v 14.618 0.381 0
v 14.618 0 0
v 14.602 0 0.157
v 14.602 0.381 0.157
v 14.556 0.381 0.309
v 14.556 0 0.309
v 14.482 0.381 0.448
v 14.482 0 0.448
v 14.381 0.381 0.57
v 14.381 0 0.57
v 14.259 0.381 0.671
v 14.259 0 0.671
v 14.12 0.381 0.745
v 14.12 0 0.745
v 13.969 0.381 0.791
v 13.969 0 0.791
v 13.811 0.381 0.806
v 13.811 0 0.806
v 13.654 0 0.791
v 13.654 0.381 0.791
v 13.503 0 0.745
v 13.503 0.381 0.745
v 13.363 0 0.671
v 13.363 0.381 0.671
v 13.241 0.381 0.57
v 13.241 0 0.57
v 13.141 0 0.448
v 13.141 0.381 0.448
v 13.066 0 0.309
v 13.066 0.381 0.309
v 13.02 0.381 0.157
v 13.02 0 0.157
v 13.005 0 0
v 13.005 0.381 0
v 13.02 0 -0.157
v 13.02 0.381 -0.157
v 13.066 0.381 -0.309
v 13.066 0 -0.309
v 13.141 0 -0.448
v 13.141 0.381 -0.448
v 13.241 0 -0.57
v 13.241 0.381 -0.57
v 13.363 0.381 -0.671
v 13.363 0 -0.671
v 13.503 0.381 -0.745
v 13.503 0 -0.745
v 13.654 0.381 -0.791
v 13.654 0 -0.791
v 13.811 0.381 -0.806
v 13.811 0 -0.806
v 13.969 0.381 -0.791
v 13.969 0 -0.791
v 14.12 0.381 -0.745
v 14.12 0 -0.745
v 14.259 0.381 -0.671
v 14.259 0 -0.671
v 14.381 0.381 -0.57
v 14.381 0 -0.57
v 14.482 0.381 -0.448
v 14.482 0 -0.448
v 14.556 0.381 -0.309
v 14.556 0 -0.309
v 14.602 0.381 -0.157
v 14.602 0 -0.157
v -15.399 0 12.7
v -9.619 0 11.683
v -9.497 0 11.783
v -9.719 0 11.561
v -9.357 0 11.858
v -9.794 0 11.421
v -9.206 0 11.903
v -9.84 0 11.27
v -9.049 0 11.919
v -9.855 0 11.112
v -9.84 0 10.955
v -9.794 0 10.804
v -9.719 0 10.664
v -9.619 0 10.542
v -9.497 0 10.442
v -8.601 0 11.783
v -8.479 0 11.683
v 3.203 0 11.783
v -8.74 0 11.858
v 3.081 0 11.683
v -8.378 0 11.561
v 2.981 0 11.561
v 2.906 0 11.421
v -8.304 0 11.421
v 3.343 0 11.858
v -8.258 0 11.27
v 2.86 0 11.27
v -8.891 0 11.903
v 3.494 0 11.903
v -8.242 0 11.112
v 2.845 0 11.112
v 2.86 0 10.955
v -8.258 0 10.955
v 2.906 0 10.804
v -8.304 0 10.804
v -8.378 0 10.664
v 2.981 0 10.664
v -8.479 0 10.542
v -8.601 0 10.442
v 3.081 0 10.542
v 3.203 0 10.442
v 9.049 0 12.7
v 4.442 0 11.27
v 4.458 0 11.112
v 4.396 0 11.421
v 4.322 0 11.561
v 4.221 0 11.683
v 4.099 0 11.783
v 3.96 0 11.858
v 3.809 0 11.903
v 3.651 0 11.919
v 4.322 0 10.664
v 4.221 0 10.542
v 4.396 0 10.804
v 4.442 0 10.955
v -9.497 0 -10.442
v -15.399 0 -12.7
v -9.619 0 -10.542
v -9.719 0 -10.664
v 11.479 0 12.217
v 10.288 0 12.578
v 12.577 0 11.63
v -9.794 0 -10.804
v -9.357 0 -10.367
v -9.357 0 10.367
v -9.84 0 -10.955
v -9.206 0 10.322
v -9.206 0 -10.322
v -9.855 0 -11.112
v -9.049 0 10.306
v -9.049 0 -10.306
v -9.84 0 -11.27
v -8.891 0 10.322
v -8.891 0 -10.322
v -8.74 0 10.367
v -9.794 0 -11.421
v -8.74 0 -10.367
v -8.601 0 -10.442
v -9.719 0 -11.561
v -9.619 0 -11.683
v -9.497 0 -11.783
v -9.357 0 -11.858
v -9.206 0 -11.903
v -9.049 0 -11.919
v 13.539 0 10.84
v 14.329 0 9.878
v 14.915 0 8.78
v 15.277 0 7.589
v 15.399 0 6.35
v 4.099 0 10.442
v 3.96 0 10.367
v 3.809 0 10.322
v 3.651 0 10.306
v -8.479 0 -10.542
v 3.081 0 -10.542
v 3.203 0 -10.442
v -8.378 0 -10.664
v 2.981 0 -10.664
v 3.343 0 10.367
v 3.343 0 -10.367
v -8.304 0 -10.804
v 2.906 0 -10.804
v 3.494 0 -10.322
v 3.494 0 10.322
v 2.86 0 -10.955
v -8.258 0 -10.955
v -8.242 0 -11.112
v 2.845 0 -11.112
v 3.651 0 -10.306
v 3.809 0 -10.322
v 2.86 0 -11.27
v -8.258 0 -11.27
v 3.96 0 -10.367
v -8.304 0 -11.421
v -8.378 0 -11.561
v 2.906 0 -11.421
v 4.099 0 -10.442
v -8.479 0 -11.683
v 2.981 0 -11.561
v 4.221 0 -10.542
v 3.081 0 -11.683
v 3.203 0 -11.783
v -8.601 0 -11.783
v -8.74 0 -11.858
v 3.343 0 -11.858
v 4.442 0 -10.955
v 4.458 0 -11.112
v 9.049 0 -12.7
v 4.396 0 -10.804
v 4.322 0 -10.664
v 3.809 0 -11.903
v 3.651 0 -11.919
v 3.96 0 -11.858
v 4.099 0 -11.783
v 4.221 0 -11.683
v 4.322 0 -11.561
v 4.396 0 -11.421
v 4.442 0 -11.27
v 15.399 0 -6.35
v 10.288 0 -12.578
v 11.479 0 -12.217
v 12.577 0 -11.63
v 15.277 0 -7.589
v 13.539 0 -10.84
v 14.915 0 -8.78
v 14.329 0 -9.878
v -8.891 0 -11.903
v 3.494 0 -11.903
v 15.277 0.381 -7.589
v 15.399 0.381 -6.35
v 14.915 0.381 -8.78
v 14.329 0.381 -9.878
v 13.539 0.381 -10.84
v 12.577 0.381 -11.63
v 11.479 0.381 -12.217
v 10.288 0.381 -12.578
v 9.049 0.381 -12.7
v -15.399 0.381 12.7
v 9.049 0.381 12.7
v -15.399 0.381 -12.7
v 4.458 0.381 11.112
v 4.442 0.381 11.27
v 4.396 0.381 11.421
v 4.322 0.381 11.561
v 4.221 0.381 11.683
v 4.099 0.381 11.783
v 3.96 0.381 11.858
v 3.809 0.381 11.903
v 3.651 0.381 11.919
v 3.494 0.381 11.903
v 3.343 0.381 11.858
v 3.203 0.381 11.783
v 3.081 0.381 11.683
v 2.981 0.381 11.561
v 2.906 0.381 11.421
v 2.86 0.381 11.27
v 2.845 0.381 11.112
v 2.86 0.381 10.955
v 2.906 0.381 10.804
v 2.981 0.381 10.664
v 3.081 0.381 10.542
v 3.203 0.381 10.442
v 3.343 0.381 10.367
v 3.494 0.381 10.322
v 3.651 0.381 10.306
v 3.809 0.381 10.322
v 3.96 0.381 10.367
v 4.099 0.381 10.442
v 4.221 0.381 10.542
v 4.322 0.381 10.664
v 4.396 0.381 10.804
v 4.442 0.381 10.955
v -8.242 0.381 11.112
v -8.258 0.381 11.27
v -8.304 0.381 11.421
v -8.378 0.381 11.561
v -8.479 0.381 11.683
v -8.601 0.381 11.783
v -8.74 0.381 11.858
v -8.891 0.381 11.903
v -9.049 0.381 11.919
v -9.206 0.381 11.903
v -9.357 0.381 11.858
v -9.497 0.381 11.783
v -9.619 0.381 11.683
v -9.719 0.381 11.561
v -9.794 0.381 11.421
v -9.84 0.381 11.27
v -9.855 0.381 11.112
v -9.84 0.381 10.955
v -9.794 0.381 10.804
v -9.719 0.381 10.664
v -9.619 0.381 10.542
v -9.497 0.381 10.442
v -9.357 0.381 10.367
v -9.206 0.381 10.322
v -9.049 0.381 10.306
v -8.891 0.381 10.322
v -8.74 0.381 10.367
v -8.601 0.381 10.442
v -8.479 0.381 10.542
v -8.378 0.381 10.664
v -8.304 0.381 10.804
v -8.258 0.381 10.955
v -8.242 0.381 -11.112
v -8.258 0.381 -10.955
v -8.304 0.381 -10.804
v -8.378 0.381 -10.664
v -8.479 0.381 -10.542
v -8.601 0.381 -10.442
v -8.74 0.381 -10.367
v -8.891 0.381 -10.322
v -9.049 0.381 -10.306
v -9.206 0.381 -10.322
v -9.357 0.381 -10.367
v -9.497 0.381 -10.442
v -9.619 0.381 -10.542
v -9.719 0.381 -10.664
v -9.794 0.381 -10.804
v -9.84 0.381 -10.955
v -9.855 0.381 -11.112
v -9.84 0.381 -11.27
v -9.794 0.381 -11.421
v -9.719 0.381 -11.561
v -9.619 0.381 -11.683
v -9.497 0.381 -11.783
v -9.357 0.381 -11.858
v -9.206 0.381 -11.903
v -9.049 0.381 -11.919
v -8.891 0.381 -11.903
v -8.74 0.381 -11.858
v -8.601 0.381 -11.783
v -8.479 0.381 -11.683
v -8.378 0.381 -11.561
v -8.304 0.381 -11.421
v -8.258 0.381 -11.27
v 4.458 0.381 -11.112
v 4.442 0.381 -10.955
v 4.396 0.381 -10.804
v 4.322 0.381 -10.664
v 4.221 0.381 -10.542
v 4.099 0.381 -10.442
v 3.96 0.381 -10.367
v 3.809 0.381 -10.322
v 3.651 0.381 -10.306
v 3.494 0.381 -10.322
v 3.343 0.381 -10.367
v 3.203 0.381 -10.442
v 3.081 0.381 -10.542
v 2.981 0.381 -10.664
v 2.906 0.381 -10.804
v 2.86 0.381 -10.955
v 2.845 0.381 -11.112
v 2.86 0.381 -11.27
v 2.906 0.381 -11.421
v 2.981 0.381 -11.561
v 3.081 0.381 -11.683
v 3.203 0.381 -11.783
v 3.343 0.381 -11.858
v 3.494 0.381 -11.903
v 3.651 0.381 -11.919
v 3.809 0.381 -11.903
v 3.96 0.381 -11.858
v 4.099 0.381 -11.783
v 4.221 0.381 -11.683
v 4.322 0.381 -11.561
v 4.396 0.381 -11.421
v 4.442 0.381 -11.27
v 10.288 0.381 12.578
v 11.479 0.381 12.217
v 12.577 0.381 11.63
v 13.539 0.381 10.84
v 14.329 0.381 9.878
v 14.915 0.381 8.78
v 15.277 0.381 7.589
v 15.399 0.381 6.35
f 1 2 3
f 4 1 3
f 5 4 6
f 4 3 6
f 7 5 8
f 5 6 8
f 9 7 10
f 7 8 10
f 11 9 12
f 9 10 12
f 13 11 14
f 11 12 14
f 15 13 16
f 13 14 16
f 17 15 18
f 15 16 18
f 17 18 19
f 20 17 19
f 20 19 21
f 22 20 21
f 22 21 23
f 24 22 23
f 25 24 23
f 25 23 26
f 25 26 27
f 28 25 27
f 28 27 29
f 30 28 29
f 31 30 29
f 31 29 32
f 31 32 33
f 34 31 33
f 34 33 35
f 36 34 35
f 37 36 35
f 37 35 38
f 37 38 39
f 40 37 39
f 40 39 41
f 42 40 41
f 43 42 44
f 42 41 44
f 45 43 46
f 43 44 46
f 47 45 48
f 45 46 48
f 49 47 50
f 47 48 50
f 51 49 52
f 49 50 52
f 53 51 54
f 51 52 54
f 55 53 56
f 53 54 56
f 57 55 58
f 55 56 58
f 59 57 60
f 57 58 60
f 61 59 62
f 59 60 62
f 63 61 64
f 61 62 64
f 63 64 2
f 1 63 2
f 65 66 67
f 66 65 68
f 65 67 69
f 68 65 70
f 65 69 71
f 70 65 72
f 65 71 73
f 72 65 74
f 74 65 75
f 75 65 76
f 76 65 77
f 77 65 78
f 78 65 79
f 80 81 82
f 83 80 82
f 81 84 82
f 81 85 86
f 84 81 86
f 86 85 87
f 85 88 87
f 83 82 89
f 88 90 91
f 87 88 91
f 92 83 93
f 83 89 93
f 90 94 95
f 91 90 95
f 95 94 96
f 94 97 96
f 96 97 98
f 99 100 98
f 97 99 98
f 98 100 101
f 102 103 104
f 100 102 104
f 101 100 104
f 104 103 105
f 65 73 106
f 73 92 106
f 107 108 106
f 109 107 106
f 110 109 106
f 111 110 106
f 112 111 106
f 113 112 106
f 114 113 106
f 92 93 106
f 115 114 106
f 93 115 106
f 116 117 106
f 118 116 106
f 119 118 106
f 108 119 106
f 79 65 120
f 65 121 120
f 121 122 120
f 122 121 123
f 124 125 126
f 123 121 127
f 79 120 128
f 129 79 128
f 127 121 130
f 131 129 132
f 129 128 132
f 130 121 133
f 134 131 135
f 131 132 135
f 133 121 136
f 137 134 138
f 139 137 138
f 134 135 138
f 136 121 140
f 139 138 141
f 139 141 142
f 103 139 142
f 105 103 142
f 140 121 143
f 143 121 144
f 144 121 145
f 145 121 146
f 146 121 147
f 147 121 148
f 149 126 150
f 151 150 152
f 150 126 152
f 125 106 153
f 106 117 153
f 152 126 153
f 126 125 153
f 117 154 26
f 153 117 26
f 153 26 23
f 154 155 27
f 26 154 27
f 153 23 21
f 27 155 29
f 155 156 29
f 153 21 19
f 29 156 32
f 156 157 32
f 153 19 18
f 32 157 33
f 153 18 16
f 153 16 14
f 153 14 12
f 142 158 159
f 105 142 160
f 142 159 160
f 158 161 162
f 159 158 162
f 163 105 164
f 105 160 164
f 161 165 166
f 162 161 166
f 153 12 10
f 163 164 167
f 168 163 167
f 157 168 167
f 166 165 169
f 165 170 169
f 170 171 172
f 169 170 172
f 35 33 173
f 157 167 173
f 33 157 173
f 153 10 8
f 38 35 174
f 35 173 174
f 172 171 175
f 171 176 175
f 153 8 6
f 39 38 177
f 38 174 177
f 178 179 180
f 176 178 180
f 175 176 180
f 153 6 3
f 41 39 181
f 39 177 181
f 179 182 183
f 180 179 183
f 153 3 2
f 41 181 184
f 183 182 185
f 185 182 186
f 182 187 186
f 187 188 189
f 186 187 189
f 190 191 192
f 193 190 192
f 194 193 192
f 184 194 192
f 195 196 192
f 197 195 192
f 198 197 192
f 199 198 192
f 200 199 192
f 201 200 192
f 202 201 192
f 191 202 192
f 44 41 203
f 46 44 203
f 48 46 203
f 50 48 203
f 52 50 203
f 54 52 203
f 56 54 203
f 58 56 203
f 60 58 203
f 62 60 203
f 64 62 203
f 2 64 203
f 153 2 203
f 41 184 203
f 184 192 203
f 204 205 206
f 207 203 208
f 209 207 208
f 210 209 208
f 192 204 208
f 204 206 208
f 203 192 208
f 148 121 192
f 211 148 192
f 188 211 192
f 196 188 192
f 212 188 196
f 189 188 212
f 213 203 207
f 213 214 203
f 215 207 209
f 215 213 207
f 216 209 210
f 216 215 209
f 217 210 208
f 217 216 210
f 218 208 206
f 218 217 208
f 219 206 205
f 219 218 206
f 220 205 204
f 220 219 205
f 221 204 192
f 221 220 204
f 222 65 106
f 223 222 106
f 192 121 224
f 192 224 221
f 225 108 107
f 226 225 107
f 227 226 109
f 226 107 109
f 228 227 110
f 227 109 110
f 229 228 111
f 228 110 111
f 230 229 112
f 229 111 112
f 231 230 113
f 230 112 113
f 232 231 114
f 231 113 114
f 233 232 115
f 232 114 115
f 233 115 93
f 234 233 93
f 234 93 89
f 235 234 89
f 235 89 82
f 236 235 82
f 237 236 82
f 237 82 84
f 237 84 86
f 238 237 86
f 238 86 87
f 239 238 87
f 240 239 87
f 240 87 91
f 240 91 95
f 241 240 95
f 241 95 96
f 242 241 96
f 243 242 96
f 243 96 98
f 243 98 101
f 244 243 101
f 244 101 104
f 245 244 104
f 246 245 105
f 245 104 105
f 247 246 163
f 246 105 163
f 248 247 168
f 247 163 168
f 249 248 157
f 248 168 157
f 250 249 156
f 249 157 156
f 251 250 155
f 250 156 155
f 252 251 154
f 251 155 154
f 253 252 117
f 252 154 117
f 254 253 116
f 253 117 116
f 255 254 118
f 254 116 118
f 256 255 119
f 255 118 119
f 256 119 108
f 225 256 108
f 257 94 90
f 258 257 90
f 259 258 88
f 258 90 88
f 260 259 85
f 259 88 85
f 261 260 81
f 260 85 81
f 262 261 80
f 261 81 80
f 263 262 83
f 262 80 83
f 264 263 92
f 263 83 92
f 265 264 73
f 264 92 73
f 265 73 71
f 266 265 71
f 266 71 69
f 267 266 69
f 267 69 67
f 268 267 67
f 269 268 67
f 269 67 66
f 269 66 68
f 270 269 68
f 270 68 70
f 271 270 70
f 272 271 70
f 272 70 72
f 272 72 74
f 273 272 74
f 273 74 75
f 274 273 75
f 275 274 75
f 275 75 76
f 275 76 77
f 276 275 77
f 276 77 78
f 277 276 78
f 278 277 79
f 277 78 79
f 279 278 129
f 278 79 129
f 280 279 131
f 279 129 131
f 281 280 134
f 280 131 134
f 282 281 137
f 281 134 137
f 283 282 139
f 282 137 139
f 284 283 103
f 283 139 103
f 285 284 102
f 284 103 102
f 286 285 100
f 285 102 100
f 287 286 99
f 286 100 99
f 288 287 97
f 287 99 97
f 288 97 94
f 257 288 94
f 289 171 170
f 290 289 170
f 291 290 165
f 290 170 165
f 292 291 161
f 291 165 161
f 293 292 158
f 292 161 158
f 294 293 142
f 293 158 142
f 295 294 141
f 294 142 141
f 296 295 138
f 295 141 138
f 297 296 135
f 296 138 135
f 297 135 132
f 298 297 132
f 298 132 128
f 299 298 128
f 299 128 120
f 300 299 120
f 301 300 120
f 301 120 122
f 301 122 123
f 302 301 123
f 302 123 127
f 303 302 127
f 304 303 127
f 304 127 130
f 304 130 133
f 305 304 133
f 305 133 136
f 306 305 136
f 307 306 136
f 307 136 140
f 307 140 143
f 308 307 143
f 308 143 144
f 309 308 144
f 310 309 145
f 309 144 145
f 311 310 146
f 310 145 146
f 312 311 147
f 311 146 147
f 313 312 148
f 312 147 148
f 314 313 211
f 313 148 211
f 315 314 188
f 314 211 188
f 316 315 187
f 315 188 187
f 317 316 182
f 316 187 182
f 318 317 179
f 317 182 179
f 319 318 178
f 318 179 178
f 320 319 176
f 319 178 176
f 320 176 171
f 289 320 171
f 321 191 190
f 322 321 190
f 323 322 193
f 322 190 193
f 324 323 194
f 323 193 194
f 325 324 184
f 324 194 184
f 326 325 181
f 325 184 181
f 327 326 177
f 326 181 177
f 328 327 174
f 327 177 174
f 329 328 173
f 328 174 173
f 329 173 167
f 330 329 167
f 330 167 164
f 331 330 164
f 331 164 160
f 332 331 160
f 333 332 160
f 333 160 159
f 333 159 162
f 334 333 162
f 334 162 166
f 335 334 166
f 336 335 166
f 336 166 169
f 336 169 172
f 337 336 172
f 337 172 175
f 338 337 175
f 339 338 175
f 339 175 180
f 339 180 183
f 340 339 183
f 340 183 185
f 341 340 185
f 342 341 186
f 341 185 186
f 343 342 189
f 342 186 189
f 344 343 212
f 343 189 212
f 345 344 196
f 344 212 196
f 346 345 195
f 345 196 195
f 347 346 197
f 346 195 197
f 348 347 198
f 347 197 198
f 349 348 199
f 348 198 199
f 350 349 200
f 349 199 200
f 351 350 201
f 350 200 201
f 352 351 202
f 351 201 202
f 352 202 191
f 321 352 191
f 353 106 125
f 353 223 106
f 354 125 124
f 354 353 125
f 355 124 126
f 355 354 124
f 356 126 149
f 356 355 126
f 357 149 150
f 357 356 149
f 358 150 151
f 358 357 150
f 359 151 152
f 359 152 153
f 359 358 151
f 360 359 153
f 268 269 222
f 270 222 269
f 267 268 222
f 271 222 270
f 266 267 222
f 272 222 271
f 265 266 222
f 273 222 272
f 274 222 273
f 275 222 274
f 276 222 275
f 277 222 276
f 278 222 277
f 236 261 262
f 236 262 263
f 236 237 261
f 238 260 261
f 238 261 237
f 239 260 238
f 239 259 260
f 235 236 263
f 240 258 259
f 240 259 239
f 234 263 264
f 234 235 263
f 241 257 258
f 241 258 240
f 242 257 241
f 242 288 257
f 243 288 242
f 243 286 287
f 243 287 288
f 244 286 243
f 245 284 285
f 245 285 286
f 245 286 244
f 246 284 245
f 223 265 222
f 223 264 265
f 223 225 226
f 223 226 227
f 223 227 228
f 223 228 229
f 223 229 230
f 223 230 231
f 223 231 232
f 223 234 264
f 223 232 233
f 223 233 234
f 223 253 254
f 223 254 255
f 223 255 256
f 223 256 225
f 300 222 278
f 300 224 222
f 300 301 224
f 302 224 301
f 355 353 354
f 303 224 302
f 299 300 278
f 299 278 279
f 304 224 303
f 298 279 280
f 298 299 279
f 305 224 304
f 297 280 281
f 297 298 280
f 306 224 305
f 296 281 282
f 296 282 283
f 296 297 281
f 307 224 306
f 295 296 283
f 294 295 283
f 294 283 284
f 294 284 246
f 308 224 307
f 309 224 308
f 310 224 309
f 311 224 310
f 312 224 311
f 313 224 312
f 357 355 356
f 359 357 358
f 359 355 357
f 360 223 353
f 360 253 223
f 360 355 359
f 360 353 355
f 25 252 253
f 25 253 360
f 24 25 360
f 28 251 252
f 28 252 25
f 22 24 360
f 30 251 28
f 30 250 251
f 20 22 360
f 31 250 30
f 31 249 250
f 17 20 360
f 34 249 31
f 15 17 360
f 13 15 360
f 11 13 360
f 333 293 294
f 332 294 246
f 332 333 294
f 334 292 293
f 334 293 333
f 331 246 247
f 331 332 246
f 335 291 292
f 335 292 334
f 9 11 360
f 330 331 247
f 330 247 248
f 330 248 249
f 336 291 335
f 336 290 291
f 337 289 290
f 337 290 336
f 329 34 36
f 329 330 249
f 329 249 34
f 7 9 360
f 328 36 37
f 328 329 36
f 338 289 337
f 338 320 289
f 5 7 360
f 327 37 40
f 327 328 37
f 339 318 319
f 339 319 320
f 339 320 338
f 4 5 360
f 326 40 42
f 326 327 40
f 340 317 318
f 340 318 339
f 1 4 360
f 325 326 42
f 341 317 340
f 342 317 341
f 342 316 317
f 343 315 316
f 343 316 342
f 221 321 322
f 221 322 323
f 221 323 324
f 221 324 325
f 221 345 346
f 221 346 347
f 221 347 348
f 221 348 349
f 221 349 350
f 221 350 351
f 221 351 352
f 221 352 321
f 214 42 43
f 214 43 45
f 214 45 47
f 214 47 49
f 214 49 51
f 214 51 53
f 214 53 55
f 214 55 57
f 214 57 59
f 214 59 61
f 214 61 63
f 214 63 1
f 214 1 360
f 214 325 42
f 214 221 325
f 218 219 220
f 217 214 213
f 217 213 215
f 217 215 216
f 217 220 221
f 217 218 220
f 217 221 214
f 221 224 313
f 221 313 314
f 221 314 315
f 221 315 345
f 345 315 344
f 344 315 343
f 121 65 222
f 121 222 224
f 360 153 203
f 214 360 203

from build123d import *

# Parameters (mm, degrees)
SKETCH1_W                 = 30.7975
SKETCH1_H                 = 25.4
BOSS_EXTRUDE1_DEPTH       = 0.381
FILLET1_R                 = 6.35
F_0_CLEARANCE_HOLE1_D     = 1.6129
F_0_CLEARANCE_HOLE1_DEPTH = 25.4
F_0_CLEARANCE_HOLE1_TIP   = 0.484564046


with BuildPart() as part:
    # Sketch1 → Boss-Extrude1 (new body)
    with BuildSketch(Plane(origin=(0, 0, 0), x_dir=(1, 0, 0), z_dir=(0, 1, 0))):
        Rectangle(SKETCH1_W, SKETCH1_H)
    extrude(amount=BOSS_EXTRUDE1_DEPTH)

    # Fillet1
    fillet1_edges = [part.edges().sort_by_distance(p)[0] for p in [
        (15.39875, 0.1905, 12.7),
        (15.39875, 0.1905, -12.7),
    ]]
    fillet(fillet1_edges, radius=FILLET1_R)

    # #0 Clearance Hole1
    with Locations(Plane(origin=(0, 0.381, 0), x_dir=(-1, 0, 0), z_dir=(0, 1, 0))):
        with Locations((9.04875, -11.1125), (-3.65125, -11.1125), (-13.81125, 0), (9.04875, 11.1125), (-3.65125, 11.1125)):
            Hole(F_0_CLEARANCE_HOLE1_D / 2, depth=F_0_CLEARANCE_HOLE1_DEPTH)
            with Locations((0, 0, -(F_0_CLEARANCE_HOLE1_DEPTH + F_0_CLEARANCE_HOLE1_TIP / 2))):  # 118° drill point
                Cone(0, F_0_CLEARANCE_HOLE1_D / 2, F_0_CLEARANCE_HOLE1_TIP, mode=Mode.SUBTRACT)


solid = part.part
